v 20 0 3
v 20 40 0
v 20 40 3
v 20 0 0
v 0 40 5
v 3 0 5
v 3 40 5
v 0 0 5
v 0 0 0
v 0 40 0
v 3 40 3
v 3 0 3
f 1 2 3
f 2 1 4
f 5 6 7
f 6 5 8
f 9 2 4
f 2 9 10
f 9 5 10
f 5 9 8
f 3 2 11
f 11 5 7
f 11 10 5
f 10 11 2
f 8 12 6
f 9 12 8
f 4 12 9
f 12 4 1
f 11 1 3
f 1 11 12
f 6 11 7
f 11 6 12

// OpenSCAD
difference()
{
	cube ([20,40,5]);
	translate([3,-1,3]) cube ([20,45,3]);
}
